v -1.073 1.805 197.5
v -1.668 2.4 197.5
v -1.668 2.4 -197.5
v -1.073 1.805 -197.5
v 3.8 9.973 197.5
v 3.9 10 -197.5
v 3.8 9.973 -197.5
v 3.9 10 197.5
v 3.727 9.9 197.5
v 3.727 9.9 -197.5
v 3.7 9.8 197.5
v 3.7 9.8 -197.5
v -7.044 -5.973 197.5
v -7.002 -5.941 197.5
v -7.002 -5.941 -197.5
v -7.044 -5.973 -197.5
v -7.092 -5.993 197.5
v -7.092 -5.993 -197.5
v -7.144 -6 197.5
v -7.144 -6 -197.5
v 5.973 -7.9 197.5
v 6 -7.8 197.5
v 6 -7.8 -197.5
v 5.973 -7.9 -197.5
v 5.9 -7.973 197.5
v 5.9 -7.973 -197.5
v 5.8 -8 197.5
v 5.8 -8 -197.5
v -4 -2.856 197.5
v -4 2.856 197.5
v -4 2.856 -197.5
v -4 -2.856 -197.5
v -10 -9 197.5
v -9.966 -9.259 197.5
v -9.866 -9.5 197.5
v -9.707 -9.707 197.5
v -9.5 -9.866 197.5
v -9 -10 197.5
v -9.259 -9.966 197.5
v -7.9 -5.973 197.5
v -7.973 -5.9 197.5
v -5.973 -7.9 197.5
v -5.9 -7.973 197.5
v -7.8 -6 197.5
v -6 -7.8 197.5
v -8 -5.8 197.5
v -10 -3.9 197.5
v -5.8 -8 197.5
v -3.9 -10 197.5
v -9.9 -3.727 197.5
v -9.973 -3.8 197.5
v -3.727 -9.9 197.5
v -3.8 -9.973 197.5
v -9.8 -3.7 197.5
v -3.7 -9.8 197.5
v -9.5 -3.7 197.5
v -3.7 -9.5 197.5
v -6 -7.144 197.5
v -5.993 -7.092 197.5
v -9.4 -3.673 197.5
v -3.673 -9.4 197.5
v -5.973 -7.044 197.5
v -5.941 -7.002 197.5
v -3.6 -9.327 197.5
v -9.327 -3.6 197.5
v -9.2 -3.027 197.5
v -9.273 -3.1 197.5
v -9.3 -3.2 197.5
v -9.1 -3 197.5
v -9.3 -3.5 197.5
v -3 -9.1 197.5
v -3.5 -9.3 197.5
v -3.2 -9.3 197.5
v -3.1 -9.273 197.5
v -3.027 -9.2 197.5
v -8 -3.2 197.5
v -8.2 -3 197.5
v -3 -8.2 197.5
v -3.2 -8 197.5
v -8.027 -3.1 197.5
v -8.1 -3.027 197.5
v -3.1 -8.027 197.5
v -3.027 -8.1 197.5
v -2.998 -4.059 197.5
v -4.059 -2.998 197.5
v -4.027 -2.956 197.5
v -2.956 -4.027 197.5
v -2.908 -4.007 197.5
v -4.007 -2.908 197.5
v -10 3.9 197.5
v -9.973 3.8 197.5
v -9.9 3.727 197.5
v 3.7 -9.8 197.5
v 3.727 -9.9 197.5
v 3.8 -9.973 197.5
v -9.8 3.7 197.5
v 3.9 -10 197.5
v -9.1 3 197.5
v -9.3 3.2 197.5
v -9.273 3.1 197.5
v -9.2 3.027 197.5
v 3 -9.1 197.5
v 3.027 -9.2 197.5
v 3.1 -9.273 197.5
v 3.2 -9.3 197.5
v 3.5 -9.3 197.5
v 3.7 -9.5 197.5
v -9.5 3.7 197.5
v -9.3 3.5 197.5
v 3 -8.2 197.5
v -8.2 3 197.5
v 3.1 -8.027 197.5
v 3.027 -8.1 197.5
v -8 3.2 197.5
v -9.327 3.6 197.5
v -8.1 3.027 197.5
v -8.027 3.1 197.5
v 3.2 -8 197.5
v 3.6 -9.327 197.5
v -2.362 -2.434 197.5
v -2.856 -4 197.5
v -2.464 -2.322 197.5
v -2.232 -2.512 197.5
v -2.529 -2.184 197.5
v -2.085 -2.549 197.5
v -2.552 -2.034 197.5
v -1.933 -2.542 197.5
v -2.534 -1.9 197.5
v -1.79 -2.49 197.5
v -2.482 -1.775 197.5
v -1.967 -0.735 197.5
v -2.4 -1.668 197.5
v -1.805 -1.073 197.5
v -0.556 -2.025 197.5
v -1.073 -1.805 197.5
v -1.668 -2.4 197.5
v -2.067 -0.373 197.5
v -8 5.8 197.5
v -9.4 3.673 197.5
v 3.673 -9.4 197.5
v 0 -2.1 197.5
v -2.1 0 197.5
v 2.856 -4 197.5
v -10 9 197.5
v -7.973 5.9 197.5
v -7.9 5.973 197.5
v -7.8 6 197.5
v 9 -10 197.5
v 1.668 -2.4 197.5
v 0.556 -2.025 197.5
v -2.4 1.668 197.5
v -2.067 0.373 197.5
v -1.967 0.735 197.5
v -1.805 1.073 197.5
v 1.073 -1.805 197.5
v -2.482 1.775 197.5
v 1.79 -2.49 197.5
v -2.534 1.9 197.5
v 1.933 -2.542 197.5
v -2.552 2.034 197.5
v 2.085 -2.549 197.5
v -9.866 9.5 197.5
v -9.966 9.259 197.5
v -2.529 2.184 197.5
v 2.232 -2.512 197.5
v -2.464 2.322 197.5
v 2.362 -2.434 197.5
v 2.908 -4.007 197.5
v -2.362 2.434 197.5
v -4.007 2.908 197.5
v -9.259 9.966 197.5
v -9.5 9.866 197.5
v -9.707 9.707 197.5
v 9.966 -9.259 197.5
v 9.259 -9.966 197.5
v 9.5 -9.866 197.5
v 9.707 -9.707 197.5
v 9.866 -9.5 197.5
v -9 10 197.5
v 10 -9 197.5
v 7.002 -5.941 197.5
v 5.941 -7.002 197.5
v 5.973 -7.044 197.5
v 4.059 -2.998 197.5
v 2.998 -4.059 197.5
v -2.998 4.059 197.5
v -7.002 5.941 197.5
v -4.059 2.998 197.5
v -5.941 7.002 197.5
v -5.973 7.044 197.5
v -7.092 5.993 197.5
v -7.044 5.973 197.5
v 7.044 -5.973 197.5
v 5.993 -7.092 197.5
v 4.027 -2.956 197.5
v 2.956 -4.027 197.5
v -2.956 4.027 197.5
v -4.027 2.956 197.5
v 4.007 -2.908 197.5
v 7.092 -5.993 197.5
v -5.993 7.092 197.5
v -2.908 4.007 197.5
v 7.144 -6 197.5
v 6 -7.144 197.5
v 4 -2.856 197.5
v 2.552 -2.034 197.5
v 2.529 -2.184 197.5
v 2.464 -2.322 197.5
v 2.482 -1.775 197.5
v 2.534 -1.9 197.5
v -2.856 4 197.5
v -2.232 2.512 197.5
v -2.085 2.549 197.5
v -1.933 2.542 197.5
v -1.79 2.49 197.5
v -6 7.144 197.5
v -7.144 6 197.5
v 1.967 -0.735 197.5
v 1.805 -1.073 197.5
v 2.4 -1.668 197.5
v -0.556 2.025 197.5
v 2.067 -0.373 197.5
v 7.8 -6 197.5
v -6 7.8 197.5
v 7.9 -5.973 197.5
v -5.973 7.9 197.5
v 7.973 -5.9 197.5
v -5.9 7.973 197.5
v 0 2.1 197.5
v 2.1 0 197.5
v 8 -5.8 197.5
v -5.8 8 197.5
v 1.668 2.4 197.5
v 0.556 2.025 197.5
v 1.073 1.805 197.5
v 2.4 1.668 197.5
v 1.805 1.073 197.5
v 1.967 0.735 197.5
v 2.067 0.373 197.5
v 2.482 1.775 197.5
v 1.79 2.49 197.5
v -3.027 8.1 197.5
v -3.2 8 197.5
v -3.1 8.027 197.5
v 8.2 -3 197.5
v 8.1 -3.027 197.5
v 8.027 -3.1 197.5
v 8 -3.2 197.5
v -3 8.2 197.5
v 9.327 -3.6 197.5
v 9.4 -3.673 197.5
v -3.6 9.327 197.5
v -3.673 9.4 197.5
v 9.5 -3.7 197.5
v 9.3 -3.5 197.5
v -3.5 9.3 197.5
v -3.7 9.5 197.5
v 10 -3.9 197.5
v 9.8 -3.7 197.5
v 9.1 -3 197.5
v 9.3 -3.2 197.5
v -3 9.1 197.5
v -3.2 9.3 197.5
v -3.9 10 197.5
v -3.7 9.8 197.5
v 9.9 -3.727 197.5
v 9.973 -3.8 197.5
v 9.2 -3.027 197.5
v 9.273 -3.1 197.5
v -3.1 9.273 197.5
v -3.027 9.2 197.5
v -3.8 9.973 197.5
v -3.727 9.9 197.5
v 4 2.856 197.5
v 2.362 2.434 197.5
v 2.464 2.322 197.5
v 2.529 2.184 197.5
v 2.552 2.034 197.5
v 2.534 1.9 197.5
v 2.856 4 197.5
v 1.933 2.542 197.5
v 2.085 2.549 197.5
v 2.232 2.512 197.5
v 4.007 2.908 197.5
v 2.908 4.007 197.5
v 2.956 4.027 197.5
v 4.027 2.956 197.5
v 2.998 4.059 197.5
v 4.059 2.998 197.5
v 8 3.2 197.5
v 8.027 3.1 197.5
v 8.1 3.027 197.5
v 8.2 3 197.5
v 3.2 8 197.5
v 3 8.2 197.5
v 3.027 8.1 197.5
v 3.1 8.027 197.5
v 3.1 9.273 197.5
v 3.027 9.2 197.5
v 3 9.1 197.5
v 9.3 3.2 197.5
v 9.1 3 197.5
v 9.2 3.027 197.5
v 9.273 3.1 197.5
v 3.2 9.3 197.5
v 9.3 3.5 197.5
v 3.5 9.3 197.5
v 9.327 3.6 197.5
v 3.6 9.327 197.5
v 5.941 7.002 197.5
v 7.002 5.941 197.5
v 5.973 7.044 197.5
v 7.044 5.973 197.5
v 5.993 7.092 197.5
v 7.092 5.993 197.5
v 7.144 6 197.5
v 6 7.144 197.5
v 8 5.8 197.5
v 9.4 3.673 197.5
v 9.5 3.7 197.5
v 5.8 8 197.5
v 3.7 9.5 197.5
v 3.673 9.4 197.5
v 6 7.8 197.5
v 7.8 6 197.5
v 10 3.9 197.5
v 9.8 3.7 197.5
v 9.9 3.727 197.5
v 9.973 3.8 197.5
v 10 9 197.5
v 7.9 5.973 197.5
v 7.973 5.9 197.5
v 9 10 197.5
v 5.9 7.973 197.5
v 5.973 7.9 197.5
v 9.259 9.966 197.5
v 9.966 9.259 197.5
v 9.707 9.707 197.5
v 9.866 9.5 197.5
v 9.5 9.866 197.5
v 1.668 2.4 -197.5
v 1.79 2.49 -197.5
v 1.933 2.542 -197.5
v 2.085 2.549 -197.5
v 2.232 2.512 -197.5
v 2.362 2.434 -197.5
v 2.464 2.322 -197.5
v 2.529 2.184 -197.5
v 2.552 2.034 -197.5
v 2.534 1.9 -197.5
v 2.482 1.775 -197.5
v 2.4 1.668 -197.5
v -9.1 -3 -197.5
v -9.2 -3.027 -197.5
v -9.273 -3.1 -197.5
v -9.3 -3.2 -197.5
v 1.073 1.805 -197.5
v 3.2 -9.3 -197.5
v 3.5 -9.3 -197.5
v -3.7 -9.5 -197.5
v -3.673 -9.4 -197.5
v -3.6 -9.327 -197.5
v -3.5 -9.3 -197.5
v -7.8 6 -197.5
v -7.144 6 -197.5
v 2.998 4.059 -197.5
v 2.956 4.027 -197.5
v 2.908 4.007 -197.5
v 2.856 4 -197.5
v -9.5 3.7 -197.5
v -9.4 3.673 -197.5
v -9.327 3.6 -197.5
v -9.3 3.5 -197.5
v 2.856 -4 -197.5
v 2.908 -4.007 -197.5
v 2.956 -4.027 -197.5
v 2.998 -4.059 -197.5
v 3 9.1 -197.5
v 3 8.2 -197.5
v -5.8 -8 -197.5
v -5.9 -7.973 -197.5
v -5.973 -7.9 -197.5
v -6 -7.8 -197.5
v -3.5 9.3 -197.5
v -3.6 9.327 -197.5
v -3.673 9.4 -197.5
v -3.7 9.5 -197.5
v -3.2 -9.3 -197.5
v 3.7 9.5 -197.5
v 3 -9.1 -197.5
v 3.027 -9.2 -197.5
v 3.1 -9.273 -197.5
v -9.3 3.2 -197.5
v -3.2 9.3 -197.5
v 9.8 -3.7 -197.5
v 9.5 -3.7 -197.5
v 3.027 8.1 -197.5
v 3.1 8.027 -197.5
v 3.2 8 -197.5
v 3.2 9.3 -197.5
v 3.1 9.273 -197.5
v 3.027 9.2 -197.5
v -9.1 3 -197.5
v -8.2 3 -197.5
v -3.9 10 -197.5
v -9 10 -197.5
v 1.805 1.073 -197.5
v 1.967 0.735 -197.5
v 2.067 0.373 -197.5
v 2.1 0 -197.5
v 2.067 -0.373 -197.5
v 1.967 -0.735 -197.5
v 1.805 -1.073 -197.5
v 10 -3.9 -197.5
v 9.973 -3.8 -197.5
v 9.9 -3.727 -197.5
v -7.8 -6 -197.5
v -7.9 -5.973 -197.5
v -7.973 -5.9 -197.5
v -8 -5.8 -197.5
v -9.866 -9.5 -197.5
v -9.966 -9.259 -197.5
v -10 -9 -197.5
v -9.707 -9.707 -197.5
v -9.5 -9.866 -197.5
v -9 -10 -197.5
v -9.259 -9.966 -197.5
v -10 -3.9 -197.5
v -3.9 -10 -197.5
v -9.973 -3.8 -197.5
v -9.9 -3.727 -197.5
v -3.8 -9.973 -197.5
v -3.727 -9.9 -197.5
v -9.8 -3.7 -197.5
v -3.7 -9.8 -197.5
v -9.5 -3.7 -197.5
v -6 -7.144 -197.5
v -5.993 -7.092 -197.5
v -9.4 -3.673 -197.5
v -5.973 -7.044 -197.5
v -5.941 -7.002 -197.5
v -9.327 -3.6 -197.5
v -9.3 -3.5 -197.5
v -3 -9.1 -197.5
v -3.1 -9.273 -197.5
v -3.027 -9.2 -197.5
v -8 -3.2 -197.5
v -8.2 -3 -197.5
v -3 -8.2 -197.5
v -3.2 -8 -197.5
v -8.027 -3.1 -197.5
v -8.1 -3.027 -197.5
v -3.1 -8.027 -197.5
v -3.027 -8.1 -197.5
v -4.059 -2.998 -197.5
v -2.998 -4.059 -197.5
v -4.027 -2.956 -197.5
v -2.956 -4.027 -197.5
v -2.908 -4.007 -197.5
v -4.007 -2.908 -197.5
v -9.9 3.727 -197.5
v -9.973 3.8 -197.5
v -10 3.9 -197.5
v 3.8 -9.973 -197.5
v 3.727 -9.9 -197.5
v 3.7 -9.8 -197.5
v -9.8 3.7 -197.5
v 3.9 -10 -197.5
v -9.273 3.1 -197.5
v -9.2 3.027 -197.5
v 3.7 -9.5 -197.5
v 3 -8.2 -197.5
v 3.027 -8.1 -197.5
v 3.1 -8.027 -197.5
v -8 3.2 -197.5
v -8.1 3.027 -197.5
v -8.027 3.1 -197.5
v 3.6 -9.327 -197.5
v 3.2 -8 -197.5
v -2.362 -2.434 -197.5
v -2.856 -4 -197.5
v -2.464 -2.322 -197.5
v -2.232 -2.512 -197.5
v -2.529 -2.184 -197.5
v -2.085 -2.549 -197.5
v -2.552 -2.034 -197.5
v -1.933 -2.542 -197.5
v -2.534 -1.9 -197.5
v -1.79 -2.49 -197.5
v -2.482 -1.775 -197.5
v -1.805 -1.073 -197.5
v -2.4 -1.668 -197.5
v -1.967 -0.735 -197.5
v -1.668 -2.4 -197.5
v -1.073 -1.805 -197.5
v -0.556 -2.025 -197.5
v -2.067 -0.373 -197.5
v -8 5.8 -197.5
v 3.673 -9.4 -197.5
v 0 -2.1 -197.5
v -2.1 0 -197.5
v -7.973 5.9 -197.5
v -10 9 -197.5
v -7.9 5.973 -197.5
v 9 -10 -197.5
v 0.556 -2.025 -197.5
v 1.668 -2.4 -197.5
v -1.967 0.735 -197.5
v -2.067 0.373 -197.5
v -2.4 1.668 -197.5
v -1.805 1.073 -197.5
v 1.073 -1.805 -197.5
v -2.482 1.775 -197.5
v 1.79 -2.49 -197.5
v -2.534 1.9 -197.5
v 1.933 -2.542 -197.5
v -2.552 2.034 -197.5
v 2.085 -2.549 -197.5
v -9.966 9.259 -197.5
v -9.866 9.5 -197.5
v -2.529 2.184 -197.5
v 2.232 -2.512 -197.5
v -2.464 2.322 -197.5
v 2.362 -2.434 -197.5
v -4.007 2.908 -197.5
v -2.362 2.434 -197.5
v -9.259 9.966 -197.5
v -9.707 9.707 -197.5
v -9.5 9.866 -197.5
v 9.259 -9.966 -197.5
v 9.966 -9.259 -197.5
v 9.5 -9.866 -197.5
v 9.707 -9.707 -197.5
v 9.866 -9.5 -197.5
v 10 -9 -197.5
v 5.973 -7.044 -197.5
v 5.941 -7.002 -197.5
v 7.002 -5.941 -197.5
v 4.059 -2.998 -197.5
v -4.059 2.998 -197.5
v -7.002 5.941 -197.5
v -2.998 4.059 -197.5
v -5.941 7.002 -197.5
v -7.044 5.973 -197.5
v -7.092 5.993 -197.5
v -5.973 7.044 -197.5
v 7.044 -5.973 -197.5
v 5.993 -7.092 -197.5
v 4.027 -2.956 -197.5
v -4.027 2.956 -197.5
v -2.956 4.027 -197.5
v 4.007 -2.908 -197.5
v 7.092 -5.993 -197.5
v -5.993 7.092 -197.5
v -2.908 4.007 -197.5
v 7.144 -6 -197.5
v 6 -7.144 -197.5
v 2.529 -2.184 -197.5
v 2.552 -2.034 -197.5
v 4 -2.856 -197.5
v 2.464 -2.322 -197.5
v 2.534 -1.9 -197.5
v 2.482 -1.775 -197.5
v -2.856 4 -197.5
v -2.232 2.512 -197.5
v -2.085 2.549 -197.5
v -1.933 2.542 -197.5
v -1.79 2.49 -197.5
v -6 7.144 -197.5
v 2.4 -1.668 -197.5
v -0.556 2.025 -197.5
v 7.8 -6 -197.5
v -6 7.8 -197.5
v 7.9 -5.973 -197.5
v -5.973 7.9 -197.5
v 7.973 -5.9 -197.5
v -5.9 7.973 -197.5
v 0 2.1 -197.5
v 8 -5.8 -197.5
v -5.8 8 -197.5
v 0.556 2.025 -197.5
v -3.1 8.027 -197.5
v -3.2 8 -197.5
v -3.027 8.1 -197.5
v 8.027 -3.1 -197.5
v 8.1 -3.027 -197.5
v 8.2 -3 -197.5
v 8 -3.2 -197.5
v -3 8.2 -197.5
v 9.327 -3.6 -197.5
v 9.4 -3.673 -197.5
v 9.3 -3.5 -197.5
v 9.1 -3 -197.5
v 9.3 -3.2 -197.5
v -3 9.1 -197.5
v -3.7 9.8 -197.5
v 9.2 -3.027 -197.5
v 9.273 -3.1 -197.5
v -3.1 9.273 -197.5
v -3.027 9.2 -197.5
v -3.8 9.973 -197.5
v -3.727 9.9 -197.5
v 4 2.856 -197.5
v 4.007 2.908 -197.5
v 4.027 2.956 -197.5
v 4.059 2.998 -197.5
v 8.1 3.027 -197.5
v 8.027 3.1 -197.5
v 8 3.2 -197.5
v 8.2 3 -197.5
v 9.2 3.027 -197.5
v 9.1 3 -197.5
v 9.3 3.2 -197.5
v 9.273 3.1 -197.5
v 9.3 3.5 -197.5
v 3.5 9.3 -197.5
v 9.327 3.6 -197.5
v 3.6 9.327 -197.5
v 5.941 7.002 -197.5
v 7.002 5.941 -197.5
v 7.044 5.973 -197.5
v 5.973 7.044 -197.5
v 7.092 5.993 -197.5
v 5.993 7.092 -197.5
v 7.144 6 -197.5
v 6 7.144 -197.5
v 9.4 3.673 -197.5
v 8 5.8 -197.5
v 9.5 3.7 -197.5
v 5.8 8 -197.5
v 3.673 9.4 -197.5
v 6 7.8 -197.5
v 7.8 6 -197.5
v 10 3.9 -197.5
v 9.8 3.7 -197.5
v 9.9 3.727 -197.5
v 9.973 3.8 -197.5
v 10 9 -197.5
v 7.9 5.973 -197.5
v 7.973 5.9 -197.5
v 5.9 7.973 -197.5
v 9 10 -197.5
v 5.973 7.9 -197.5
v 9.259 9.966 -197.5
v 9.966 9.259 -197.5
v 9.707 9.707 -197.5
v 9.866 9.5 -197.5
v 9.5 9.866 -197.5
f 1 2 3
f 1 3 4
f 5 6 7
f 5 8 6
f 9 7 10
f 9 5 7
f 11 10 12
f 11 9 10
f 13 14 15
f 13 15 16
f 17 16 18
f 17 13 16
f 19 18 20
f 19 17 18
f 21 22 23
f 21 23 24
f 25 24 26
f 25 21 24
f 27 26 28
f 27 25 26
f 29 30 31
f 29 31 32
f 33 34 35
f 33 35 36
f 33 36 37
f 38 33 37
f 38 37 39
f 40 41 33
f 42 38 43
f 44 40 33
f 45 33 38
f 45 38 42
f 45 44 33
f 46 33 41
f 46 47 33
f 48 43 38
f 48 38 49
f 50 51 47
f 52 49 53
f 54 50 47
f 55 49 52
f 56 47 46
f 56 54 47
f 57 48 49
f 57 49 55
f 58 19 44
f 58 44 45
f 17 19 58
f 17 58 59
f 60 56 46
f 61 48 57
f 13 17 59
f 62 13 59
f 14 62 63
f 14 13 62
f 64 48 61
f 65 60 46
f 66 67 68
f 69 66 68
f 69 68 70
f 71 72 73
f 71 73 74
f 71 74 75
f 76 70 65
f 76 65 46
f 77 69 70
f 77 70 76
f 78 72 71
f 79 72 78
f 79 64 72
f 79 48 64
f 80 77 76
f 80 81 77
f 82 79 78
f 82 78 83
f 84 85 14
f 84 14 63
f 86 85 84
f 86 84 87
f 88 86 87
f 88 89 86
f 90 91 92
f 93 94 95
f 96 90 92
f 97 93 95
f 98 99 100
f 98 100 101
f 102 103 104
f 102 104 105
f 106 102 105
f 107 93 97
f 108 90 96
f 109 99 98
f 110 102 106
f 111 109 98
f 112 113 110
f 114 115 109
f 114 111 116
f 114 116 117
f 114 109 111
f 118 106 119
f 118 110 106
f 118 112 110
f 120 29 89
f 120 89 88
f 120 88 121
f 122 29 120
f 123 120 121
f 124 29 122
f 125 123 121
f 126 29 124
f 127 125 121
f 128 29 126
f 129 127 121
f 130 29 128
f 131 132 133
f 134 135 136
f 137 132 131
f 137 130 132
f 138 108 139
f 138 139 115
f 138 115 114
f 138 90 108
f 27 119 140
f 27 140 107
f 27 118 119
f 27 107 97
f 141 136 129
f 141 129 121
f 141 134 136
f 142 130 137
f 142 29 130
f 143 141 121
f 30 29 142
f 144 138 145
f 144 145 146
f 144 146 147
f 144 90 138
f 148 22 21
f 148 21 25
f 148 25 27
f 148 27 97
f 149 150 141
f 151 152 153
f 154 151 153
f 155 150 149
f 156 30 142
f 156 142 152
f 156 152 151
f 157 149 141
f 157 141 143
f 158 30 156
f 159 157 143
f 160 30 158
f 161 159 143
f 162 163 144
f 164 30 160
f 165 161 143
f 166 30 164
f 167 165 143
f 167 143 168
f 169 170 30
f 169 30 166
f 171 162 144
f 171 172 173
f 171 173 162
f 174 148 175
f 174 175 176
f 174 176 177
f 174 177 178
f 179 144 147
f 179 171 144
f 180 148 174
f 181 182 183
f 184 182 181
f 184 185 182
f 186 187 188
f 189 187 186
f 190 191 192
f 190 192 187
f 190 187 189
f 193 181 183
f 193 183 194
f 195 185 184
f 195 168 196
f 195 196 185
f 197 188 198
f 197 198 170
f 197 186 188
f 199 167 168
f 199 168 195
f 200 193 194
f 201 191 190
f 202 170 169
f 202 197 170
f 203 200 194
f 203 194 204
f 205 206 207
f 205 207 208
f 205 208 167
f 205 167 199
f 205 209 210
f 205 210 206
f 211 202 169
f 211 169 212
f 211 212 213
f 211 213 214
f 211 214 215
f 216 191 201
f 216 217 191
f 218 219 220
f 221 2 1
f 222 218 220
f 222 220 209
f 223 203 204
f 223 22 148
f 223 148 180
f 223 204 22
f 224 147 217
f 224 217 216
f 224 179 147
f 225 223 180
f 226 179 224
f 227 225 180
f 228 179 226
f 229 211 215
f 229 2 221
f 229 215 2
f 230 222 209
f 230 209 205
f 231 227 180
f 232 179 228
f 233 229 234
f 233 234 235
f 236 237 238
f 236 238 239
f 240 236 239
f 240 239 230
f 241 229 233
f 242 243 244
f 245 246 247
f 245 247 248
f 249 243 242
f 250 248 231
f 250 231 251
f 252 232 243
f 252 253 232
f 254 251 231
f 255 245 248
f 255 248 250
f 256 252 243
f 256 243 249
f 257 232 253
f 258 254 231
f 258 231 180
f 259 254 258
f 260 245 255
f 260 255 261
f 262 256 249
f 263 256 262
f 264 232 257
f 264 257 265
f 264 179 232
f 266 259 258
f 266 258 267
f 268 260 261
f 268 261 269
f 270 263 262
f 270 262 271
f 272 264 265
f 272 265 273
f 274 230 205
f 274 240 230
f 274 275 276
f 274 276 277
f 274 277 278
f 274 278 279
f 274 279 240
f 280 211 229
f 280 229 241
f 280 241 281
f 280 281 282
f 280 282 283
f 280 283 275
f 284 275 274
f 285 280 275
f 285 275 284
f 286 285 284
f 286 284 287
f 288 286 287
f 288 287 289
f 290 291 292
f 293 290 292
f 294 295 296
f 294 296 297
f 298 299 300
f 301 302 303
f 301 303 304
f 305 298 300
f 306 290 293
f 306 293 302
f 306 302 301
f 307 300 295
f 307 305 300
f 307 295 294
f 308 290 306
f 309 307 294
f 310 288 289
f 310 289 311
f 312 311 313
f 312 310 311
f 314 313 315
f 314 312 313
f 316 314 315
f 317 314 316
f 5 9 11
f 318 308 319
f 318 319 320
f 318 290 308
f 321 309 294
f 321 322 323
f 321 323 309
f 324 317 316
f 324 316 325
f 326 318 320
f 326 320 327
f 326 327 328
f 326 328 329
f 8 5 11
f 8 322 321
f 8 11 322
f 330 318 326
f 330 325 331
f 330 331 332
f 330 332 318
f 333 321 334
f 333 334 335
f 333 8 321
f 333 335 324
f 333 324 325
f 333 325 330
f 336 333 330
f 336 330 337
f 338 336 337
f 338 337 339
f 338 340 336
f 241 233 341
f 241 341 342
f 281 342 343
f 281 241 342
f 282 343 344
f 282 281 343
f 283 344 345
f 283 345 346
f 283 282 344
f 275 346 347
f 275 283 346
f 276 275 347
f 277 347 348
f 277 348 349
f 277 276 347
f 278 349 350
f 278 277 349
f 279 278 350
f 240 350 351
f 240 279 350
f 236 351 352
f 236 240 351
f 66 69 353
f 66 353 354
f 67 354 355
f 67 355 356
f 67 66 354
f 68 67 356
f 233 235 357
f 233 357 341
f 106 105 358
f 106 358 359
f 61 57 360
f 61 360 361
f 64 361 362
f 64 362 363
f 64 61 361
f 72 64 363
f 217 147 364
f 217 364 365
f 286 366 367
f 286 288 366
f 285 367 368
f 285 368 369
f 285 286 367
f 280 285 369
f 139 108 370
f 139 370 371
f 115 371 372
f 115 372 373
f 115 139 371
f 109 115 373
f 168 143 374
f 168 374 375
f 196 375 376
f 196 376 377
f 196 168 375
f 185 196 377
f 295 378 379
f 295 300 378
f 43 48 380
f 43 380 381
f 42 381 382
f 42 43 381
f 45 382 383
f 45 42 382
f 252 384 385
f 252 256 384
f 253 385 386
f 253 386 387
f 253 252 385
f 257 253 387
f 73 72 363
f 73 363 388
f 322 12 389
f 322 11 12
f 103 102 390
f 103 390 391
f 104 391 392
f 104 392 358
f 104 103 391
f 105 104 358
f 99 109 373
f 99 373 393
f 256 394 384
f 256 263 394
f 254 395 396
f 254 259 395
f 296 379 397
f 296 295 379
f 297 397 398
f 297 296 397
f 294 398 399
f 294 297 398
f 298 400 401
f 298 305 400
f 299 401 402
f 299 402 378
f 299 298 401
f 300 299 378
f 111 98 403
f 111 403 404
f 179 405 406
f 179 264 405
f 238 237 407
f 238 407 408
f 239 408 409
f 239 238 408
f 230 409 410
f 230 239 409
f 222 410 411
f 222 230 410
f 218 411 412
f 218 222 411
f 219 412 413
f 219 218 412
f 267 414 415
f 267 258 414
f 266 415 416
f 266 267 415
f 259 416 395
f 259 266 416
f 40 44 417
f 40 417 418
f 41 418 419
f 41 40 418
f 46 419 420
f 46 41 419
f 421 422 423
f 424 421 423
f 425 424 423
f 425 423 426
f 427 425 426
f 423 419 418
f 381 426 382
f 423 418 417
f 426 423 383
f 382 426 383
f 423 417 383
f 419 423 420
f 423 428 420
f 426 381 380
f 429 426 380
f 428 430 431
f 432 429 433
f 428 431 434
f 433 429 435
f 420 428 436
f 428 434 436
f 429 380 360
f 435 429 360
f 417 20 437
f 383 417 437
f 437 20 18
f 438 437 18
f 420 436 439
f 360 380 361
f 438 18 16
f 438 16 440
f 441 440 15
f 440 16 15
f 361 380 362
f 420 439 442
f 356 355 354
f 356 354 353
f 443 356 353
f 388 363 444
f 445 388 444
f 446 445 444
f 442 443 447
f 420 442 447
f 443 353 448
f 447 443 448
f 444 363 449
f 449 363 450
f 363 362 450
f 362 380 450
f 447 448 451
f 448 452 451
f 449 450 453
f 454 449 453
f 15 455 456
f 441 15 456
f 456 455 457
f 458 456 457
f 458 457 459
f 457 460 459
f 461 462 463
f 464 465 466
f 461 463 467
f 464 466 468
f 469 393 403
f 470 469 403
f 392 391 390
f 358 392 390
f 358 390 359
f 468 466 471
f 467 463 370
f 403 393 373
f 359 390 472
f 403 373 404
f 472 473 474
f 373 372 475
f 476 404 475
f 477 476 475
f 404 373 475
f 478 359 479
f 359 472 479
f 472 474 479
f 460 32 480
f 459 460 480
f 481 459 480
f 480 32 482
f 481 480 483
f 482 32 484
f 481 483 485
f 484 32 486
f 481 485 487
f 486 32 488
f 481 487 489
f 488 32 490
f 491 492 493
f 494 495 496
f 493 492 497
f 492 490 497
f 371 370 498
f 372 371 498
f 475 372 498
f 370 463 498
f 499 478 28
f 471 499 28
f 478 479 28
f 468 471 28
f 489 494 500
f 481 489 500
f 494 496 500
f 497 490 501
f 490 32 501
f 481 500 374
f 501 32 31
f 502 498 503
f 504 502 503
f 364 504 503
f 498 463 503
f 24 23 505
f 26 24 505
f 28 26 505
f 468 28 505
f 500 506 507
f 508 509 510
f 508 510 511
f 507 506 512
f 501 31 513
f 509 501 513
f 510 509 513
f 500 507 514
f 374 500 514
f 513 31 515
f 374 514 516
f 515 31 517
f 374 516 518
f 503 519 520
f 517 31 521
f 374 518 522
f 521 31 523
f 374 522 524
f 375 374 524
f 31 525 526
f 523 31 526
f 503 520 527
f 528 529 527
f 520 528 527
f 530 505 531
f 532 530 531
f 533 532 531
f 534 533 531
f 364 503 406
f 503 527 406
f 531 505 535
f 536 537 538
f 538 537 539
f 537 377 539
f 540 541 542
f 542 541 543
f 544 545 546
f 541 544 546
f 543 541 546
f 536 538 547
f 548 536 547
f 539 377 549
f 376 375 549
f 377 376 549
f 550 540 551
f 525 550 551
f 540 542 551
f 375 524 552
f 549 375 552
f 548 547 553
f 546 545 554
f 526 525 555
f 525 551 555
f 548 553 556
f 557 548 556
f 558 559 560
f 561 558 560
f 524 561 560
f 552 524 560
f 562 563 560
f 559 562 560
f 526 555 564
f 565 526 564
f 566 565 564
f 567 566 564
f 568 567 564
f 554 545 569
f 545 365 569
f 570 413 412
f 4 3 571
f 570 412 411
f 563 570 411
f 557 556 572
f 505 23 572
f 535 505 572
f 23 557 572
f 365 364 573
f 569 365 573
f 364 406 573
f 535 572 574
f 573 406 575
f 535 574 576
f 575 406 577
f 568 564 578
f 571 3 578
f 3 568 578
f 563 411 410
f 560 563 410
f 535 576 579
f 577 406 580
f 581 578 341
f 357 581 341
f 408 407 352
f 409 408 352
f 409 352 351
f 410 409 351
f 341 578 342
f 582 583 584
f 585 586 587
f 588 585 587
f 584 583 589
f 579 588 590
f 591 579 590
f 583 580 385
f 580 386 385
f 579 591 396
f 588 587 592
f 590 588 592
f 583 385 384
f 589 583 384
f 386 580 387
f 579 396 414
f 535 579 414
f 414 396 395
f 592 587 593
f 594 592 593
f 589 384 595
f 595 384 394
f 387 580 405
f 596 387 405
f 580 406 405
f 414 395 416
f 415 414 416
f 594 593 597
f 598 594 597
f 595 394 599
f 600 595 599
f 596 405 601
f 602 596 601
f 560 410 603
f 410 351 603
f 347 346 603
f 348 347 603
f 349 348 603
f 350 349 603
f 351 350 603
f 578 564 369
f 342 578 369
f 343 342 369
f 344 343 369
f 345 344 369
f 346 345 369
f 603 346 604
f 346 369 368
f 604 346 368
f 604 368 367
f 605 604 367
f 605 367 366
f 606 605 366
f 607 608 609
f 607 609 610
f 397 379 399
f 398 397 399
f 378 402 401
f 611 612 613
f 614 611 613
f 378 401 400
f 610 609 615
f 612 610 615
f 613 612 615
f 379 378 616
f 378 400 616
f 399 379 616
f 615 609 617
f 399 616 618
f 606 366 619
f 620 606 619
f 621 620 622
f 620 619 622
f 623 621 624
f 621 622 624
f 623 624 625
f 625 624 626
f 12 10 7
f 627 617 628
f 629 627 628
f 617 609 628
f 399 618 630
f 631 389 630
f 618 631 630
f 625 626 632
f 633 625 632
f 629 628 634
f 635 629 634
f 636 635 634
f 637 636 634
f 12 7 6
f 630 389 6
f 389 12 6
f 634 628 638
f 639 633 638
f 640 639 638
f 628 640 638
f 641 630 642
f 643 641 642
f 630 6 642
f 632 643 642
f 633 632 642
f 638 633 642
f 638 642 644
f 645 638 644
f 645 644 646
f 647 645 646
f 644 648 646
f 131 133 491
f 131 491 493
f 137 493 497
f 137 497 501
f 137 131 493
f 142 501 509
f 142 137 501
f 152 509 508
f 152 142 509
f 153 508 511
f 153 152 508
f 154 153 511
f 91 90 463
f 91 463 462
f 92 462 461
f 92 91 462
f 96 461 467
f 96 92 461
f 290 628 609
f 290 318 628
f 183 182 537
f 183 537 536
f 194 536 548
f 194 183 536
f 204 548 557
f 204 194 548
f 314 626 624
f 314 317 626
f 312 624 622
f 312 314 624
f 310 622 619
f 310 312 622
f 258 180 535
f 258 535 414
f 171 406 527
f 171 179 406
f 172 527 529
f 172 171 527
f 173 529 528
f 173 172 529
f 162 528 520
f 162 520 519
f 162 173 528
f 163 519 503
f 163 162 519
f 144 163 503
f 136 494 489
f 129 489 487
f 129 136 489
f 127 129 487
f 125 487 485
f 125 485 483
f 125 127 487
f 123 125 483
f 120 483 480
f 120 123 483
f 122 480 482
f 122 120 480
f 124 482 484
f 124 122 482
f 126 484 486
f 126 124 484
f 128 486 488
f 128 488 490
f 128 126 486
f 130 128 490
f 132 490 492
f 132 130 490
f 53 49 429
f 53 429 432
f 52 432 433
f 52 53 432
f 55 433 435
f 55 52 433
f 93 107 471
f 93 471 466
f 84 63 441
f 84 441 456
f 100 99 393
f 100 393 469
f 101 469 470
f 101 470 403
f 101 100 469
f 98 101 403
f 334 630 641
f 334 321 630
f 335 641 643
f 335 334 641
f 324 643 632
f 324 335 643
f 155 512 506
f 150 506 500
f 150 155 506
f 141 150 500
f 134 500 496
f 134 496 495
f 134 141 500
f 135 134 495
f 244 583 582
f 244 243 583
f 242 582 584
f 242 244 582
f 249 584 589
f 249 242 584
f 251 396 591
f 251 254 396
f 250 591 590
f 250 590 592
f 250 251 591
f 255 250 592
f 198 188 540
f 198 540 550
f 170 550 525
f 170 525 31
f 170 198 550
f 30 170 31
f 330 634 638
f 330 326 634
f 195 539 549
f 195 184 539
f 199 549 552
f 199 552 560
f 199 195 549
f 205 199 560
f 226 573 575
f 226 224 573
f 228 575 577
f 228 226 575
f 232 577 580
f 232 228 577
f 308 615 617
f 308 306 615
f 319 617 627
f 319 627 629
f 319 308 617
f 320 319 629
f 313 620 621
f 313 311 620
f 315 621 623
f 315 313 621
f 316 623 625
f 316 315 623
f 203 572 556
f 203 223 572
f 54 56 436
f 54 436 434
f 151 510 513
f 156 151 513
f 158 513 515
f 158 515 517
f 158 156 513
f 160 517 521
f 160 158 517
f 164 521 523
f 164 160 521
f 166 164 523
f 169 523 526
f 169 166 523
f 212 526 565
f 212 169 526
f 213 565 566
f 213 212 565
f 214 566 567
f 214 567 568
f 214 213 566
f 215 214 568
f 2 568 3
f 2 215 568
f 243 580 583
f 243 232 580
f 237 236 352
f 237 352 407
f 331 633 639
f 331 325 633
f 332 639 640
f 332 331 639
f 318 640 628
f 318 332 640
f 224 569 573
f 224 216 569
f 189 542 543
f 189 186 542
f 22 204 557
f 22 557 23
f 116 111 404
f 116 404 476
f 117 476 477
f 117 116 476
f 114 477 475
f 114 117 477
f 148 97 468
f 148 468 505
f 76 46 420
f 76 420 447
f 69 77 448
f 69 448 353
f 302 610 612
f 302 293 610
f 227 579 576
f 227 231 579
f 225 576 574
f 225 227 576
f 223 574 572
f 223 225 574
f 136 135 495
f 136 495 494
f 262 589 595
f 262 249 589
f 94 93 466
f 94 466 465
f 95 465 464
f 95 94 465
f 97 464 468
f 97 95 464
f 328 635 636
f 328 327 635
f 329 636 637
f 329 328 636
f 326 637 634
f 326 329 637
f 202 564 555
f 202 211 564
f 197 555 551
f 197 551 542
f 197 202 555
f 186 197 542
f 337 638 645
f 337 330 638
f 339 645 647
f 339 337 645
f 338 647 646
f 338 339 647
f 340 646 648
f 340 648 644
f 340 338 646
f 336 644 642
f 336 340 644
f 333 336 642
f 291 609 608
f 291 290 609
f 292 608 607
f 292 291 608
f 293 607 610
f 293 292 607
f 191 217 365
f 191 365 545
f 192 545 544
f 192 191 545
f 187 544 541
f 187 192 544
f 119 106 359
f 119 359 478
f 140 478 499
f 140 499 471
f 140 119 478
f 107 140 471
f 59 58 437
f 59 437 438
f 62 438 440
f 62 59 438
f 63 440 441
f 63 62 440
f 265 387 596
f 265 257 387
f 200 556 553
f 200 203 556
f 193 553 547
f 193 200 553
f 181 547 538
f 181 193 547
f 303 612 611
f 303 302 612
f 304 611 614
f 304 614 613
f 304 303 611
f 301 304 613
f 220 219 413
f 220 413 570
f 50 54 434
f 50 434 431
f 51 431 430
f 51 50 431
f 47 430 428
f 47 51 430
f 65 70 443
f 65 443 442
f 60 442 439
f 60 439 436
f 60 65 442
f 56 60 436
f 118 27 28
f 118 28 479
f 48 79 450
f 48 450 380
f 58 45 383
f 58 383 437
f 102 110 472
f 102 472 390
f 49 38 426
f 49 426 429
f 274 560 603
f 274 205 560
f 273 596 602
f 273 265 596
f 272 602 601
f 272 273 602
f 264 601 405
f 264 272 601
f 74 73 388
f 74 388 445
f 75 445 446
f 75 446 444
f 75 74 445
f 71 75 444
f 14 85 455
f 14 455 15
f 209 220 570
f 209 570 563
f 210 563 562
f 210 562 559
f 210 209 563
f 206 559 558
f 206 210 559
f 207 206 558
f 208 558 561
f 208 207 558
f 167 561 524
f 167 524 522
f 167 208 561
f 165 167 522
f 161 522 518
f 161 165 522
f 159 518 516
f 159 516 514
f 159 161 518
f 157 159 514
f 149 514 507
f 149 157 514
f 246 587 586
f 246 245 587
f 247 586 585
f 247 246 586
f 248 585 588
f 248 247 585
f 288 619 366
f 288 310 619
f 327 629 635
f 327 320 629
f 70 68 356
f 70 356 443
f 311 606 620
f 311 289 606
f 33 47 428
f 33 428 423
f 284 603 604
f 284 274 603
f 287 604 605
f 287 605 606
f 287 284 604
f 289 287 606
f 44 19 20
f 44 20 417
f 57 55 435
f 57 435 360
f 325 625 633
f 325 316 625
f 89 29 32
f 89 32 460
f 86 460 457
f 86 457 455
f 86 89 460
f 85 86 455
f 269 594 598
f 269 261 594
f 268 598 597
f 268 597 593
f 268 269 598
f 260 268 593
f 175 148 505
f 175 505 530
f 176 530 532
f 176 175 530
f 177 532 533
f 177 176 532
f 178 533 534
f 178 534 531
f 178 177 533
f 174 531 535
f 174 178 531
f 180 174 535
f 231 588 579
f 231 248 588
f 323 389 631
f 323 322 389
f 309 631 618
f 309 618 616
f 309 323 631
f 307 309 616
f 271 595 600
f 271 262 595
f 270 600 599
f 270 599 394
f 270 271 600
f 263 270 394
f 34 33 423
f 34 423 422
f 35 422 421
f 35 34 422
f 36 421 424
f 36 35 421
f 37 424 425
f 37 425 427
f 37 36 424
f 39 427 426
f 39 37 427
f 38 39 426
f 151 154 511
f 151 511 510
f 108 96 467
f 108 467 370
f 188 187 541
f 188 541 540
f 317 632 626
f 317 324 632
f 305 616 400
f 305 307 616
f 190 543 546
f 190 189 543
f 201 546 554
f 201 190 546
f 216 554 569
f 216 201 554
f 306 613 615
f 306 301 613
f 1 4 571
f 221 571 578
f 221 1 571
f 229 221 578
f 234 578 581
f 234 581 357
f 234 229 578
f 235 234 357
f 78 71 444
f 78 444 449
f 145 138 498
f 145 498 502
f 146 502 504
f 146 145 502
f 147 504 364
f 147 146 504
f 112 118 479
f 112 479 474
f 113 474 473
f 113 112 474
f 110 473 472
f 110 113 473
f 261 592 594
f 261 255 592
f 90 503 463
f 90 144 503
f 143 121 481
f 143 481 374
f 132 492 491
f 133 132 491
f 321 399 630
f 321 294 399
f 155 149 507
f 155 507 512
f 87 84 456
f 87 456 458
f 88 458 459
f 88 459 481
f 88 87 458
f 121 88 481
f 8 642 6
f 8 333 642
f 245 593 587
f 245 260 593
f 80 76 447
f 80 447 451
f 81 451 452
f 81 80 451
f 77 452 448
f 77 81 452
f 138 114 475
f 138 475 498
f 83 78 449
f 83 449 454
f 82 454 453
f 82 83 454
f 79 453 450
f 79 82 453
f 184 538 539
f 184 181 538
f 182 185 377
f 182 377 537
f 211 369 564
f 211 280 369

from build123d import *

# Parameters (mm, degrees)
RESSALTO_EXTRUS_O1_DEPTH = 197.5


with BuildPart() as part:
    # Model → Ressalto-extrusão1 (new, symmetric)
    with BuildSketch(Plane.XY):
        with BuildLine():
            Line((-10, 9), (-10, 3.9))
            ThreePointArc((-10, 3.9), (-9.941421356, 3.758578644), (-9.8, 3.7))
            Line((-9.8, 3.7), (-9.5, 3.7))
            ThreePointArc((-9.5, 3.7), (-9.358578644, 3.641421356), (-9.3, 3.5))
            Line((-9.3, 3.5), (-9.3, 3.2))
            ThreePointArc((-9.3, 3.2), (-9.241421356, 3.058578644), (-9.1, 3))
            Line((-9.1, 3), (-8.2, 3))
            ThreePointArc((-8.2, 3), (-8.058578644, 3.058578644), (-8, 3.2))
            Line((-8, 3.2), (-8, 5.8))
            ThreePointArc((-8, 5.8), (-7.941421356, 5.941421356), (-7.8, 6))
            Line((-7.8, 6), (-7.143502884, 6))
            ThreePointArc((-7.143502884, 6), (-7.066966198, 5.984775907), (-7.002081528, 5.941421356))
            Line((-7.002081528, 5.941421356), (-4.058578644, 2.997918472))
            ThreePointArc((-4.058578644, 2.997918472), (-4.015224093, 2.933033802), (-4, 2.856497116))
            Line((-4, 2.856497116), (-4, -2.856497116))
            ThreePointArc((-4, -2.856497116), (-4.015224093, -2.933033802), (-4.058578644, -2.997918472))
            Line((-4.058578644, -2.997918472), (-7.002081528, -5.941421356))
            ThreePointArc((-7.002081528, -5.941421356), (-7.066966198, -5.984775907), (-7.143502884, -6))
            Line((-7.143502884, -6), (-7.8, -6))
            ThreePointArc((-7.8, -6), (-7.941421356, -5.941421356), (-8, -5.8))
            Line((-8, -5.8), (-8, -3.2))
            ThreePointArc((-8, -3.2), (-8.058578644, -3.058578644), (-8.2, -3))
            Line((-8.2, -3), (-9.1, -3))
            ThreePointArc((-9.1, -3), (-9.241421356, -3.058578644), (-9.3, -3.2))
            Line((-9.3, -3.2), (-9.3, -3.5))
            ThreePointArc((-9.3, -3.5), (-9.358578644, -3.641421356), (-9.5, -3.7))
            Line((-9.5, -3.7), (-9.8, -3.7))
            ThreePointArc((-9.8, -3.7), (-9.941421356, -3.758578644), (-10, -3.9))
            Line((-10, -3.9), (-10, -9))
            ThreePointArc((-10, -9), (-9.707106781, -9.707106781), (-9, -10))
            Line((-9, -10), (-3.9, -10))
            ThreePointArc((-3.9, -10), (-3.758578644, -9.941421356), (-3.7, -9.8))
            Line((-3.7, -9.8), (-3.7, -9.5))
            ThreePointArc((-3.7, -9.5), (-3.641421356, -9.358578644), (-3.5, -9.3))
            Line((-3.5, -9.3), (-3.2, -9.3))
            ThreePointArc((-3.2, -9.3), (-3.058578644, -9.241421356), (-3, -9.1))
            Line((-3, -9.1), (-3, -8.2))
            ThreePointArc((-3, -8.2), (-3.058578644, -8.058578644), (-3.2, -8))
            Line((-3.2, -8), (-5.8, -8))
            ThreePointArc((-5.8, -8), (-5.941421356, -7.941421356), (-6, -7.8))
            Line((-6, -7.8), (-6, -7.143502884))
            ThreePointArc((-6, -7.143502884), (-5.984775907, -7.066966198), (-5.941421356, -7.002081528))
            Line((-5.941421356, -7.002081528), (-2.997918472, -4.058578644))
            ThreePointArc((-2.997918472, -4.058578644), (-2.933033802, -4.015224093), (-2.856497116, -4))
            Line((-2.856497116, -4), (2.856497116, -4))
            ThreePointArc((2.856497116, -4), (2.933033802, -4.015224093), (2.997918472, -4.058578644))
            Line((2.997918472, -4.058578644), (5.941421356, -7.002081528))
            ThreePointArc((5.941421356, -7.002081528), (5.984775907, -7.066966198), (6, -7.143502884))
            Line((6, -7.143502884), (6, -7.8))
            ThreePointArc((6, -7.8), (5.941421356, -7.941421356), (5.8, -8))
            Line((5.8, -8), (3.2, -8))
            ThreePointArc((3.2, -8), (3.058578644, -8.058578644), (3, -8.2))
            Line((3, -8.2), (3, -9.1))
            ThreePointArc((3, -9.1), (3.058578644, -9.241421356), (3.2, -9.3))
            Line((3.2, -9.3), (3.5, -9.3))
            ThreePointArc((3.5, -9.3), (3.641421356, -9.358578644), (3.7, -9.5))
            Line((3.7, -9.5), (3.7, -9.8))
            ThreePointArc((3.7, -9.8), (3.758578644, -9.941421356), (3.9, -10))
            Line((3.9, -10), (9, -10))
            ThreePointArc((9, -10), (9.707106781, -9.707106781), (10, -9))
            Line((10, -9), (10, -3.9))
            ThreePointArc((10, -3.9), (9.941421356, -3.758578644), (9.8, -3.7))
            Line((9.8, -3.7), (9.5, -3.7))
            ThreePointArc((9.5, -3.7), (9.358578644, -3.641421356), (9.3, -3.5))
            Line((9.3, -3.5), (9.3, -3.2))
            ThreePointArc((9.3, -3.2), (9.241421356, -3.058578644), (9.1, -3))
            Line((9.1, -3), (8.2, -3))
            ThreePointArc((8.2, -3), (8.058578644, -3.058578644), (8, -3.2))
            Line((8, -3.2), (8, -5.8))
            ThreePointArc((8, -5.8), (7.941421356, -5.941421356), (7.8, -6))
            Line((7.8, -6), (7.143502884, -6))
            ThreePointArc((7.143502884, -6), (7.066966198, -5.984775907), (7.002081528, -5.941421356))
            Line((7.002081528, -5.941421356), (4.058578644, -2.997918472))
            ThreePointArc((4.058578644, -2.997918472), (4.015224093, -2.933033802), (4, -2.856497116))
            Line((4, -2.856497116), (4, 2.856497116))
            ThreePointArc((4, 2.856497116), (4.015224093, 2.933033802), (4.058578644, 2.997918472))
            Line((4.058578644, 2.997918472), (7.002081528, 5.941421356))
            ThreePointArc((7.002081528, 5.941421356), (7.066966198, 5.984775907), (7.143502884, 6))
            Line((7.143502884, 6), (7.8, 6))
            ThreePointArc((7.8, 6), (7.941421356, 5.941421356), (8, 5.8))
            Line((8, 5.8), (8, 3.2))
            ThreePointArc((8, 3.2), (8.058578644, 3.058578644), (8.2, 3))
            Line((8.2, 3), (9.1, 3))
            ThreePointArc((9.1, 3), (9.241421356, 3.058578644), (9.3, 3.2))
            Line((9.3, 3.2), (9.3, 3.5))
            ThreePointArc((9.3, 3.5), (9.358578644, 3.641421356), (9.5, 3.7))
            Line((9.5, 3.7), (9.8, 3.7))
            ThreePointArc((9.8, 3.7), (9.941421356, 3.758578644), (10, 3.9))
            Line((10, 3.9), (10, 9))
            ThreePointArc((10, 9), (9.707106781, 9.707106781), (9, 10))
            Line((9, 10), (3.9, 10))
            ThreePointArc((3.9, 10), (3.758578644, 9.941421356), (3.7, 9.8))
            Line((3.7, 9.8), (3.7, 9.5))
            ThreePointArc((3.7, 9.5), (3.641421356, 9.358578644), (3.5, 9.3))
            Line((3.5, 9.3), (3.2, 9.3))
            ThreePointArc((3.2, 9.3), (3.058578644, 9.241421356), (3, 9.1))
            Line((3, 9.1), (3, 8.2))
            ThreePointArc((3, 8.2), (3.058578644, 8.058578644), (3.2, 8))
            Line((3.2, 8), (5.8, 8))
            ThreePointArc((5.8, 8), (5.941421356, 7.941421356), (6, 7.8))
            Line((6, 7.8), (6, 7.143502884))
            ThreePointArc((6, 7.143502884), (5.984775907, 7.066966198), (5.941421356, 7.002081528))
            Line((5.941421356, 7.002081528), (2.997918472, 4.058578644))
            ThreePointArc((2.997918472, 4.058578644), (2.933033802, 4.015224093), (2.856497116, 4))
            Line((2.856497116, 4), (-2.856497116, 4))
            ThreePointArc((-2.856497116, 4), (-2.933033802, 4.015224093), (-2.997918472, 4.058578644))
            Line((-2.997918472, 4.058578644), (-5.941421356, 7.002081528))
            ThreePointArc((-5.941421356, 7.002081528), (-5.984775907, 7.066966198), (-6, 7.143502884))
            Line((-6, 7.143502884), (-6, 7.8))
            ThreePointArc((-6, 7.8), (-5.941421356, 7.941421356), (-5.8, 8))
            Line((-5.8, 8), (-3.2, 8))
            ThreePointArc((-3.2, 8), (-3.058578644, 8.058578644), (-3, 8.2))
            Line((-3, 8.2), (-3, 9.1))
            ThreePointArc((-3, 9.1), (-3.058578644, 9.241421356), (-3.2, 9.3))
            Line((-3.2, 9.3), (-3.5, 9.3))
            ThreePointArc((-3.5, 9.3), (-3.641421356, 9.358578644), (-3.7, 9.5))
            Line((-3.7, 9.5), (-3.7, 9.8))
            ThreePointArc((-3.7, 9.8), (-3.758578644, 9.941421356), (-3.9, 10))
            Line((-3.9, 10), (-9, 10))
            ThreePointArc((-9, 10), (-9.707106781, 9.707106781), (-10, 9))
        make_face()
        with BuildLine():
            Line((-2.4, -1.667949192), (-1.805131169, -1.073080362))
            ThreePointArc((-1.805131169, -1.073080362), (-2.02494151, -0.556427787), (-2.1, 7.27e-07))
            ThreePointArc((-2.1, 7.27e-07), (-2.024941317, 0.556428488), (-1.805131169, 1.073080362))
            Line((-1.805131169, 1.073080362), (-2.4, 1.667949192))
            ThreePointArc((-2.4, 1.667949192), (-2.512209799, 1.835882992), (-2.551612686, 2.033974417))
            ThreePointArc((-2.551612686, 2.033974417), (-2.2320662, 2.512209799), (-1.667949192, 2.4))
            Line((-1.667949192, 2.4), (-1.073080362, 1.805131169))
            ThreePointArc((-1.073080362, 1.805131169), (0, 2.1), (1.073080362, 1.805131169))
            Line((1.073080362, 1.805131169), (1.667949192, 2.4))
            ThreePointArc((1.667949192, 2.4), (2.232066117, 2.512209833), (2.551612686, 2.033974596))
            ThreePointArc((2.551612686, 2.033974596), (2.512209833, 1.835883075), (2.4, 1.667949192))
            Line((2.4, 1.667949192), (1.805131169, 1.073080362))
            ThreePointArc((1.805131169, 1.073080362), (2.024941413, 0.556428138), (2.1, 0))
            ThreePointArc((2.1, 0), (2.024941413, -0.556428138), (1.805131169, -1.073080362))
            Line((1.805131169, -1.073080362), (2.4, -1.667949192))
            ThreePointArc((2.4, -1.667949192), (2.512209833, -1.835883075), (2.551612686, -2.033974596))
            ThreePointArc((2.551612686, -2.033974596), (2.232066117, -2.512209833), (1.667949192, -2.4))
            Line((1.667949192, -2.4), (1.073080362, -1.805131169))
            ThreePointArc((1.073080362, -1.805131169), (0, -2.1), (-1.073080362, -1.805131169))
            Line((-1.073080362, -1.805131169), (-1.667949192, -2.4))
            ThreePointArc((-1.667949192, -2.4), (-2.232066034, -2.512209867), (-2.551612686, -2.033974776))
            ThreePointArc((-2.551612686, -2.033974776), (-2.512209867, -1.835883158), (-2.4, -1.667949192))
        make_face(mode=Mode.SUBTRACT)
    extrude(amount=RESSALTO_EXTRUS_O1_DEPTH, both=True)


solid = part.part
